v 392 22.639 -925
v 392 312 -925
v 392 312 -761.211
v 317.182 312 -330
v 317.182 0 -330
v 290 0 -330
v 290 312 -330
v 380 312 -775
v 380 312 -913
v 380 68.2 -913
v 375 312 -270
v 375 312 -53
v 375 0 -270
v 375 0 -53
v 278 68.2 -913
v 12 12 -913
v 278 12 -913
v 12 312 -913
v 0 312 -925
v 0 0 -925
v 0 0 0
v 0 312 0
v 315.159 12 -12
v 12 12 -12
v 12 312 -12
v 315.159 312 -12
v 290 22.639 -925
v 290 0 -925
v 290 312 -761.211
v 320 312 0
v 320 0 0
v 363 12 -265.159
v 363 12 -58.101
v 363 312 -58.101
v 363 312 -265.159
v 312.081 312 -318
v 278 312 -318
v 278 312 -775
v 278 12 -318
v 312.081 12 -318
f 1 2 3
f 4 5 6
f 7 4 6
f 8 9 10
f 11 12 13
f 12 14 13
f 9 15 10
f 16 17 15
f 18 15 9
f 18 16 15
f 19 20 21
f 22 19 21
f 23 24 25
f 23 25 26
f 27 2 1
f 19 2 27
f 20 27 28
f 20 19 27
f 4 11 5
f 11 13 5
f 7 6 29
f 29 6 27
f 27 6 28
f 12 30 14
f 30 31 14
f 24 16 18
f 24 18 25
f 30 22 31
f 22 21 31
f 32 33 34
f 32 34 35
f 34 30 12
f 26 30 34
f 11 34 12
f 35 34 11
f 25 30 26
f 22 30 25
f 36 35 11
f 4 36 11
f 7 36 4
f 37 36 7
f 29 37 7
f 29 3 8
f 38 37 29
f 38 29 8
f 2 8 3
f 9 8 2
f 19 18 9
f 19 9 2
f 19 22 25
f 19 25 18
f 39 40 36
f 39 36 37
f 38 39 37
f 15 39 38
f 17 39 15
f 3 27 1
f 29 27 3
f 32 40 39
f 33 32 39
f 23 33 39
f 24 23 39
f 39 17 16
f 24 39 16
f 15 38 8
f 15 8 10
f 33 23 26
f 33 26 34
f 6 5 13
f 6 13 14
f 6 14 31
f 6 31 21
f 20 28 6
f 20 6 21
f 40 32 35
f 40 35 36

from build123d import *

# Parameters (mm, degrees)
SKETCH_1_W          = 290
SKETCH_1_H          = 925
EXTRUDE_1_DEPTH     = 12
EXTRUDE_3_DEPTH     = 12
EXTRUDE_4_DEPTH     = 300
CUT_EXTRUDE_1_DEPTH = 12
EXTRUDE_5_DEPTH     = 90
EXTRUDE_6_DEPTH     = 102
EXTRUDE_7_DEPTH     = 12


with BuildPart() as part:
    # 草图1 → 凸台-拉伸1 (new body)
    with BuildSketch(Plane(origin=(0, 0, 0), x_dir=(1, 0, 0), z_dir=(0, 1, 0))):
        with Locations((145, 462.5)):
            Rectangle(SKETCH_1_W, SKETCH_1_H)
    extrude(amount=EXTRUDE_1_DEPTH)

    # 草图3 → 凸台-拉伸3 (add)
    with BuildSketch(Plane(origin=(0, 12, 0), x_dir=(1, 0, 0), z_dir=(0, 1, 0))):
        Polygon((290, 330), (317.181818182, 330), (375, 270), (375, 53), (320, 0), (290, 0), align=None)
    extrude(amount=-EXTRUDE_3_DEPTH)

    # 草图4 → 凸台-拉伸4 (add)
    with BuildSketch(Plane(origin=(0, 12, 0), x_dir=(1, 0, 0), z_dir=(0, 1, 0))):
        Polygon((0, 925), (0, 0), (320, 0), (375, 53), (375, 270), (317.181818182, 330), (290, 330), (290, 925), align=None)
        Polygon((12, 913), (12, 12), (315.159103589, 12), (363, 58.101227451), (363, 265.159103589), (312.080590731, 318), (278, 318), (278, 913), align=None, mode=Mode.SUBTRACT)
    extrude(amount=EXTRUDE_4_DEPTH)

    # 草图5 → 切除-拉伸1 (cut)
    with BuildSketch(Plane(origin=(290, 0, 0), x_dir=(0, 0, -1), z_dir=(1, 0, 0))):
        Polygon((775, 312), (925, 47), (925, 312), align=None)
    extrude(amount=-CUT_EXTRUDE_1_DEPTH, mode=Mode.SUBTRACT)

    # 草图7 → 凸台-拉伸5 (add)
    with BuildSketch(Plane(origin=(290, 0, 0), x_dir=(0, 0, -1), z_dir=(1, 0, 0))):
        Polygon((775, 312), (925, 47), (925, 22.639376034), (761.210967567, 312), align=None)
    extrude(amount=EXTRUDE_5_DEPTH)

    # 草图8 → 凸台-拉伸6 (add)
    with BuildSketch(Plane(origin=(278, 0, 0), x_dir=(0, 0, -1), z_dir=(1, 0, 0))):
        Polygon((925, 312), (925, 47), (913, 68.2), (913, 312), align=None)
    extrude(amount=EXTRUDE_6_DEPTH)

    # 草图9 → 凸台-拉伸7 (add)
    with BuildSketch(Plane(origin=(380, 0, 0), x_dir=(0, 0, -1), z_dir=(1, 0, 0))):
        Polygon((761.210967567, 312), (925, 312), (925, 22.639376034), align=None)
    extrude(amount=EXTRUDE_7_DEPTH)


solid = part.part
